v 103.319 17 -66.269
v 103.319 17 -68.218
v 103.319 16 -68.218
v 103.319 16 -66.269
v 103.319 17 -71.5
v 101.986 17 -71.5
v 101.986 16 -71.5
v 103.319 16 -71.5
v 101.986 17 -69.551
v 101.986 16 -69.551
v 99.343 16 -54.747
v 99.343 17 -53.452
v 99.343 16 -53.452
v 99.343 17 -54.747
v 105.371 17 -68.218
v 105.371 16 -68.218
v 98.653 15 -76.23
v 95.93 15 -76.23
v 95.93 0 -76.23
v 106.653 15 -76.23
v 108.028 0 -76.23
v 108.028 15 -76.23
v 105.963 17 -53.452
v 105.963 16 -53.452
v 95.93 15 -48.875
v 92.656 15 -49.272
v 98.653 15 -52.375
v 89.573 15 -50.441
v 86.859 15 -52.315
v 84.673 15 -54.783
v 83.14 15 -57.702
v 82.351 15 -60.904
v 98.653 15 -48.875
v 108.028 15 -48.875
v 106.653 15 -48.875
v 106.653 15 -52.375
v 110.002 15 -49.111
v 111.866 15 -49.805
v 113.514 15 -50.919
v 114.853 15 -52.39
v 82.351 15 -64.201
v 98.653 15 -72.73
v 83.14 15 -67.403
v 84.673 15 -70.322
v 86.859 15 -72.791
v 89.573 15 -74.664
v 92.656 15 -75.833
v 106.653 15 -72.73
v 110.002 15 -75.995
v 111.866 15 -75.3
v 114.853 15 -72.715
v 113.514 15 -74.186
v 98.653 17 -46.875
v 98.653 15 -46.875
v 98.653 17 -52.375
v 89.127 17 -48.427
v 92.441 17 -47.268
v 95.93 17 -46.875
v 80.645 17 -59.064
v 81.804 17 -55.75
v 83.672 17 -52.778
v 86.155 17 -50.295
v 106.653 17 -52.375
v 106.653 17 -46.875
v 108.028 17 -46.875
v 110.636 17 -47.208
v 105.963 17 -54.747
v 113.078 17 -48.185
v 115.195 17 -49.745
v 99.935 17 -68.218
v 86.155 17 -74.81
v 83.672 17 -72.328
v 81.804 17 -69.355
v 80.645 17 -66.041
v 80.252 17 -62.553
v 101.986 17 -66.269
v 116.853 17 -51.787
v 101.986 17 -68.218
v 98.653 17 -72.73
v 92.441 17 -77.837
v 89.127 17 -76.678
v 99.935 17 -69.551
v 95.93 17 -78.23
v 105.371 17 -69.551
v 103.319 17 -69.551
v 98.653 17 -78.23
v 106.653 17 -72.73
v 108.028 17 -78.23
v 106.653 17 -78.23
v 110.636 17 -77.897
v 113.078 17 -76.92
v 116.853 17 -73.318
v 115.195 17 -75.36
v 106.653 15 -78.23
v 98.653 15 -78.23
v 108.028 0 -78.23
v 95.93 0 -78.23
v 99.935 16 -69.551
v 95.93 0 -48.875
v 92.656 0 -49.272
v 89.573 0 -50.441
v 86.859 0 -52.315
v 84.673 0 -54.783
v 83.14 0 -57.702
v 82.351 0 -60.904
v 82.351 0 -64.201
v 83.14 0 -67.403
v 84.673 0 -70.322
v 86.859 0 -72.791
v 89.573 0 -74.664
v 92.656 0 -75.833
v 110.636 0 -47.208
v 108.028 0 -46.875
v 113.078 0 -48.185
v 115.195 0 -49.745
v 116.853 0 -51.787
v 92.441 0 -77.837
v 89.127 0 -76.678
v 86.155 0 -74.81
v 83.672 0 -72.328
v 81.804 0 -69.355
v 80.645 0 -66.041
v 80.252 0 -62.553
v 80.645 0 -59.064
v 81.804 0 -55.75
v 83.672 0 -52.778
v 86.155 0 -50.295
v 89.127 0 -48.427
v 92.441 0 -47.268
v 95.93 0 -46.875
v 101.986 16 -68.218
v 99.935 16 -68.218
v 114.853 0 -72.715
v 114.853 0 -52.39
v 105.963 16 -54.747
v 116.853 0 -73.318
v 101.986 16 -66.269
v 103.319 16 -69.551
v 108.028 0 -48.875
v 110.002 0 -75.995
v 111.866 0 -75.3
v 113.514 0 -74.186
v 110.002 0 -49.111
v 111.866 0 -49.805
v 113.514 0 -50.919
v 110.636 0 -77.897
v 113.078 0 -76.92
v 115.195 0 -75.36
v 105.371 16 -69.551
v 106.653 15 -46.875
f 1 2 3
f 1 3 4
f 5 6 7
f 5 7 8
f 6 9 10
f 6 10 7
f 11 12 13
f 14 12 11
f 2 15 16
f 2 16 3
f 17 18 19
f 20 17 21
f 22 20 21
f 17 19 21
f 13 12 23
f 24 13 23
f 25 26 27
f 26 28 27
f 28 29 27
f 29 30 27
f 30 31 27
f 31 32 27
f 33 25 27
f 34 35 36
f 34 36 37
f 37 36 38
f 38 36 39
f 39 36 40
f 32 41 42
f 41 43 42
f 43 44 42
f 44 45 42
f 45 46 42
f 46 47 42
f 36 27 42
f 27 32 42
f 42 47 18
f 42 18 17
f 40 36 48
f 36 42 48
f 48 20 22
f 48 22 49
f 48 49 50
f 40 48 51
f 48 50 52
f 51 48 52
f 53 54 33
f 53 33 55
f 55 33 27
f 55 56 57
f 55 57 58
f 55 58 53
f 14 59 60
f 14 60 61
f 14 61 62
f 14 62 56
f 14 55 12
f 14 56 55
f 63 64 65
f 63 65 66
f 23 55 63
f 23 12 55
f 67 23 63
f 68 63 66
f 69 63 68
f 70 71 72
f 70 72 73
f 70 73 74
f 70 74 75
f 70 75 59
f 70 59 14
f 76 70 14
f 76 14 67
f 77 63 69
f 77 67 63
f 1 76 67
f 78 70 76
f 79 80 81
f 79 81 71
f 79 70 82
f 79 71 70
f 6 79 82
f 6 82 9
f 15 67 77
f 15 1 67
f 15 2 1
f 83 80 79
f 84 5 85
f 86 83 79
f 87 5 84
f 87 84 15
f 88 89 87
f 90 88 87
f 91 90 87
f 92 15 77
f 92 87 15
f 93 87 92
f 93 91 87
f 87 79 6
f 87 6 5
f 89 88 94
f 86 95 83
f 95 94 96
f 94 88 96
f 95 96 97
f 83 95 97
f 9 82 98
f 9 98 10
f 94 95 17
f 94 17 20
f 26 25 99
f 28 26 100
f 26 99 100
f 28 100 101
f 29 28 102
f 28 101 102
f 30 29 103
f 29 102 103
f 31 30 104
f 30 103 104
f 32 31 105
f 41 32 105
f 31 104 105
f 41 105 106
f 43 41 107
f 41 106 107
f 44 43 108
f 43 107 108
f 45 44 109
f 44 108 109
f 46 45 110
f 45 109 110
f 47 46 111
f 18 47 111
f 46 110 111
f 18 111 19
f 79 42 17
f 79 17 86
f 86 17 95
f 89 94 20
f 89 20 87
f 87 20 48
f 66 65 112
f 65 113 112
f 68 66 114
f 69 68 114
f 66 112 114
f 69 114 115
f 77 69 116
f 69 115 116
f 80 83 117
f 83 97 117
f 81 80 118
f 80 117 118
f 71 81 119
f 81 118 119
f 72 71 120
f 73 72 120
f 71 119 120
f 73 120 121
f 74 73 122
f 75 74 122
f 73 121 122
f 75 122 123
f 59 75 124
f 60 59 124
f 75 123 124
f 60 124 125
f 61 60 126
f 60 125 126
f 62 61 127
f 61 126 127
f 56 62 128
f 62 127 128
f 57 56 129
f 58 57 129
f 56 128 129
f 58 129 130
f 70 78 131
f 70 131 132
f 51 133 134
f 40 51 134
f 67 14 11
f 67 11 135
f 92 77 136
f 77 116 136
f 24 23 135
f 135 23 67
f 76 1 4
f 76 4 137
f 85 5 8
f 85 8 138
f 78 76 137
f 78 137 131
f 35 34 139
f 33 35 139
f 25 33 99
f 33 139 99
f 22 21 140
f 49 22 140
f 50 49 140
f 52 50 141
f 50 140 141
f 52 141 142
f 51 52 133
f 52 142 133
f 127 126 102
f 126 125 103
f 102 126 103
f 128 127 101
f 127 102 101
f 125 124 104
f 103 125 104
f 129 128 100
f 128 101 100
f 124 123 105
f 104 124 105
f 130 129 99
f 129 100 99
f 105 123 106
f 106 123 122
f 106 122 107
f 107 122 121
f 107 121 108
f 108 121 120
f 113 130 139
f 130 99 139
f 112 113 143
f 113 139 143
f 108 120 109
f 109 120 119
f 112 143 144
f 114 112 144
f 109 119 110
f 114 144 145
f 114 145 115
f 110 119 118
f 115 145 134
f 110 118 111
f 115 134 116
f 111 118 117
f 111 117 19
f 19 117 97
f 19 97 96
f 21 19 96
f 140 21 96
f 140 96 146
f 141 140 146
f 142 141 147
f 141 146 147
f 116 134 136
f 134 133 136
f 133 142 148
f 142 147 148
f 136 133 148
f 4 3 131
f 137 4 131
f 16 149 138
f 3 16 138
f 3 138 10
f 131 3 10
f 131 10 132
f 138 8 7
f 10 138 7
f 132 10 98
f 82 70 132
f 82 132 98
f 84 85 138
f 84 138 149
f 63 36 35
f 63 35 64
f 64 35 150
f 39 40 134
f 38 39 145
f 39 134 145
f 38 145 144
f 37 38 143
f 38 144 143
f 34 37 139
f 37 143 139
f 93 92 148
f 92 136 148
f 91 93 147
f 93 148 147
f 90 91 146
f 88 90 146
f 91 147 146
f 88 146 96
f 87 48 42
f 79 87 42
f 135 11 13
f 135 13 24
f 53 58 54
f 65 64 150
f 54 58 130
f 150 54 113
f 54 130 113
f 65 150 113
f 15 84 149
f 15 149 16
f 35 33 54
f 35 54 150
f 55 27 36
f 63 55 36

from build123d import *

# Parameters (mm, degrees)
BOSS_EXTRUDE1_DEPTH = 15
BOSS_EXTRUDE2_DEPTH = 2
SKETCH4_W           = 6.62021856
SKETCH4_H           = 1.294383367
CUT_EXTRUDE1_DEPTH  = 1


with BuildPart() as part:
    # Sketch1 → Boss-Extrude1 (new body)
    with BuildSketch(Plane(origin=(0, 0, 0), x_dir=(1, 0, 0), z_dir=(0, 1, 0))):
        with BuildLine():
            Line((95.929523932, 46.874695494), (108.027641063, 46.874695494))
            ThreePointArc((108.027641063, 46.874695494), (113.077675482, 48.185488052), (116.852687564, 51.786919511))
            Line((116.852687564, 51.786919511), (116.852687564, 73.318230601))
            ThreePointArc((116.852687564, 73.318230601), (113.077675482, 76.919662059), (108.027641063, 78.230454618))
            Line((108.027641063, 78.230454618), (95.929523932, 78.230454618))
            ThreePointArc((95.929523932, 78.230454618), (80.25164437, 62.552575056), (95.929523932, 46.874695494))
        make_face()
        with BuildLine():
            Line((95.929523932, 76.230454618), (108.027641063, 76.230454618))
            ThreePointArc((108.027641063, 76.230454618), (111.866170296, 75.300049315), (114.852687564, 72.715349081))
            Line((114.852687564, 72.715349081), (114.852687564, 52.389801031))
            ThreePointArc((114.852687564, 52.389801031), (111.866170296, 49.805100796), (108.027641063, 48.874695494))
            Line((108.027641063, 48.874695494), (95.929523932, 48.874695494))
            ThreePointArc((95.929523932, 48.874695494), (82.25164437, 62.552575056), (95.929523932, 76.230454618))
        make_face(mode=Mode.SUBTRACT)
    extrude(amount=BOSS_EXTRUDE1_DEPTH)

    # Sketch3 → Boss-Extrude2 (add)
    with BuildSketch(Plane(origin=(0, 15, 0), x_dir=(1, 0, 0), z_dir=(0, 1, 0))):
        with BuildLine():
            Line((108.027641063, 76.230454618), (106.652687564, 76.230454618))
            Line((106.652687564, 76.230454618), (106.652687564, 72.730454618))
            Line((106.652687564, 72.730454618), (98.652687564, 72.730454618))
            Line((98.652687564, 72.730454618), (98.652687564, 76.230454618))
            Line((98.652687564, 76.230454618), (95.929523932, 76.230454618))
            ThreePointArc((95.929523932, 76.230454618), (82.25164437, 62.552575056), (95.929523932, 48.874695494))
            Line((95.929523932, 48.874695494), (98.652687564, 48.874695494))
            Line((98.652687564, 48.874695494), (98.652687564, 52.374695494))
            Line((98.652687564, 52.374695494), (106.652687564, 52.374695494))
            Line((106.652687564, 52.374695494), (106.652687564, 48.874695494))
            Line((106.652687564, 48.874695494), (108.027641063, 48.874695494))
            ThreePointArc((108.027641063, 48.874695494), (111.866170296, 49.805100796), (114.852687564, 52.389801031))
            Line((114.852687564, 52.389801031), (114.852687564, 72.715349081))
            ThreePointArc((114.852687564, 72.715349081), (111.866170296, 75.300049315), (108.027641063, 76.230454618))
        make_face()
        with BuildLine():
            Line((98.652687564, 76.230454618), (98.652687564, 78.230454618))
            Line((98.652687564, 78.230454618), (95.929523932, 78.230454618))
            ThreePointArc((95.929523932, 78.230454618), (80.25164437, 62.552575056), (95.929523932, 46.874695494))
            Line((95.929523932, 46.874695494), (98.652687564, 46.874695494))
            Line((98.652687564, 46.874695494), (98.652687564, 48.874695494))
            Line((98.652687564, 48.874695494), (95.929523932, 48.874695494))
            ThreePointArc((95.929523932, 48.874695494), (82.25164437, 62.552575056), (95.929523932, 76.230454618))
            Line((95.929523932, 76.230454618), (98.652687564, 76.230454618))
        make_face()
        with BuildLine():
            Line((108.027641063, 78.230454618), (106.652687564, 78.230454618))
            Line((106.652687564, 78.230454618), (106.652687564, 76.230454618))
            Line((106.652687564, 76.230454618), (108.027641063, 76.230454618))
            ThreePointArc((108.027641063, 76.230454618), (111.866170296, 75.300049315), (114.852687564, 72.715349081))
            Line((114.852687564, 72.715349081), (114.852687564, 52.389801031))
            ThreePointArc((114.852687564, 52.389801031), (111.866170296, 49.805100796), (108.027641063, 48.874695494))
            Line((108.027641063, 48.874695494), (106.652687564, 48.874695494))
            Line((106.652687564, 48.874695494), (106.652687564, 46.874695494))
            Line((106.652687564, 46.874695494), (108.027641063, 46.874695494))
            ThreePointArc((108.027641063, 46.874695494), (113.077675482, 48.185488052), (116.852687564, 51.786919511))
            Line((116.852687564, 51.786919511), (116.852687564, 73.318230601))
            ThreePointArc((116.852687564, 73.318230601), (113.077675482, 76.919662059), (108.027641063, 78.230454618))
        make_face()
    extrude(amount=BOSS_EXTRUDE2_DEPTH)

    # Sketch4 → Cut-Extrude1 (cut)
    with BuildSketch(Plane(origin=(0, 17, 0), x_dir=(1, 0, 0), z_dir=(0, 1, 0))):
        with Locations((102.652687564, 54.099354042)):
            Rectangle(SKETCH4_W, SKETCH4_H)
        Polygon((103.319354231, 68.217634105), (103.319354231, 66.268916157), (101.986020897, 66.268916157), (101.986020897, 68.217634105), (99.934738846, 68.217634105), (99.934738846, 69.550967439), (101.986020897, 69.550967439), (101.986020897, 71.499685387), (103.319354231, 71.499685387), (103.319354231, 69.550967439), (105.370636282, 69.550967439), (105.370636282, 68.217634105), align=None)
    extrude(amount=-CUT_EXTRUDE1_DEPTH, mode=Mode.SUBTRACT)


solid = part.part
